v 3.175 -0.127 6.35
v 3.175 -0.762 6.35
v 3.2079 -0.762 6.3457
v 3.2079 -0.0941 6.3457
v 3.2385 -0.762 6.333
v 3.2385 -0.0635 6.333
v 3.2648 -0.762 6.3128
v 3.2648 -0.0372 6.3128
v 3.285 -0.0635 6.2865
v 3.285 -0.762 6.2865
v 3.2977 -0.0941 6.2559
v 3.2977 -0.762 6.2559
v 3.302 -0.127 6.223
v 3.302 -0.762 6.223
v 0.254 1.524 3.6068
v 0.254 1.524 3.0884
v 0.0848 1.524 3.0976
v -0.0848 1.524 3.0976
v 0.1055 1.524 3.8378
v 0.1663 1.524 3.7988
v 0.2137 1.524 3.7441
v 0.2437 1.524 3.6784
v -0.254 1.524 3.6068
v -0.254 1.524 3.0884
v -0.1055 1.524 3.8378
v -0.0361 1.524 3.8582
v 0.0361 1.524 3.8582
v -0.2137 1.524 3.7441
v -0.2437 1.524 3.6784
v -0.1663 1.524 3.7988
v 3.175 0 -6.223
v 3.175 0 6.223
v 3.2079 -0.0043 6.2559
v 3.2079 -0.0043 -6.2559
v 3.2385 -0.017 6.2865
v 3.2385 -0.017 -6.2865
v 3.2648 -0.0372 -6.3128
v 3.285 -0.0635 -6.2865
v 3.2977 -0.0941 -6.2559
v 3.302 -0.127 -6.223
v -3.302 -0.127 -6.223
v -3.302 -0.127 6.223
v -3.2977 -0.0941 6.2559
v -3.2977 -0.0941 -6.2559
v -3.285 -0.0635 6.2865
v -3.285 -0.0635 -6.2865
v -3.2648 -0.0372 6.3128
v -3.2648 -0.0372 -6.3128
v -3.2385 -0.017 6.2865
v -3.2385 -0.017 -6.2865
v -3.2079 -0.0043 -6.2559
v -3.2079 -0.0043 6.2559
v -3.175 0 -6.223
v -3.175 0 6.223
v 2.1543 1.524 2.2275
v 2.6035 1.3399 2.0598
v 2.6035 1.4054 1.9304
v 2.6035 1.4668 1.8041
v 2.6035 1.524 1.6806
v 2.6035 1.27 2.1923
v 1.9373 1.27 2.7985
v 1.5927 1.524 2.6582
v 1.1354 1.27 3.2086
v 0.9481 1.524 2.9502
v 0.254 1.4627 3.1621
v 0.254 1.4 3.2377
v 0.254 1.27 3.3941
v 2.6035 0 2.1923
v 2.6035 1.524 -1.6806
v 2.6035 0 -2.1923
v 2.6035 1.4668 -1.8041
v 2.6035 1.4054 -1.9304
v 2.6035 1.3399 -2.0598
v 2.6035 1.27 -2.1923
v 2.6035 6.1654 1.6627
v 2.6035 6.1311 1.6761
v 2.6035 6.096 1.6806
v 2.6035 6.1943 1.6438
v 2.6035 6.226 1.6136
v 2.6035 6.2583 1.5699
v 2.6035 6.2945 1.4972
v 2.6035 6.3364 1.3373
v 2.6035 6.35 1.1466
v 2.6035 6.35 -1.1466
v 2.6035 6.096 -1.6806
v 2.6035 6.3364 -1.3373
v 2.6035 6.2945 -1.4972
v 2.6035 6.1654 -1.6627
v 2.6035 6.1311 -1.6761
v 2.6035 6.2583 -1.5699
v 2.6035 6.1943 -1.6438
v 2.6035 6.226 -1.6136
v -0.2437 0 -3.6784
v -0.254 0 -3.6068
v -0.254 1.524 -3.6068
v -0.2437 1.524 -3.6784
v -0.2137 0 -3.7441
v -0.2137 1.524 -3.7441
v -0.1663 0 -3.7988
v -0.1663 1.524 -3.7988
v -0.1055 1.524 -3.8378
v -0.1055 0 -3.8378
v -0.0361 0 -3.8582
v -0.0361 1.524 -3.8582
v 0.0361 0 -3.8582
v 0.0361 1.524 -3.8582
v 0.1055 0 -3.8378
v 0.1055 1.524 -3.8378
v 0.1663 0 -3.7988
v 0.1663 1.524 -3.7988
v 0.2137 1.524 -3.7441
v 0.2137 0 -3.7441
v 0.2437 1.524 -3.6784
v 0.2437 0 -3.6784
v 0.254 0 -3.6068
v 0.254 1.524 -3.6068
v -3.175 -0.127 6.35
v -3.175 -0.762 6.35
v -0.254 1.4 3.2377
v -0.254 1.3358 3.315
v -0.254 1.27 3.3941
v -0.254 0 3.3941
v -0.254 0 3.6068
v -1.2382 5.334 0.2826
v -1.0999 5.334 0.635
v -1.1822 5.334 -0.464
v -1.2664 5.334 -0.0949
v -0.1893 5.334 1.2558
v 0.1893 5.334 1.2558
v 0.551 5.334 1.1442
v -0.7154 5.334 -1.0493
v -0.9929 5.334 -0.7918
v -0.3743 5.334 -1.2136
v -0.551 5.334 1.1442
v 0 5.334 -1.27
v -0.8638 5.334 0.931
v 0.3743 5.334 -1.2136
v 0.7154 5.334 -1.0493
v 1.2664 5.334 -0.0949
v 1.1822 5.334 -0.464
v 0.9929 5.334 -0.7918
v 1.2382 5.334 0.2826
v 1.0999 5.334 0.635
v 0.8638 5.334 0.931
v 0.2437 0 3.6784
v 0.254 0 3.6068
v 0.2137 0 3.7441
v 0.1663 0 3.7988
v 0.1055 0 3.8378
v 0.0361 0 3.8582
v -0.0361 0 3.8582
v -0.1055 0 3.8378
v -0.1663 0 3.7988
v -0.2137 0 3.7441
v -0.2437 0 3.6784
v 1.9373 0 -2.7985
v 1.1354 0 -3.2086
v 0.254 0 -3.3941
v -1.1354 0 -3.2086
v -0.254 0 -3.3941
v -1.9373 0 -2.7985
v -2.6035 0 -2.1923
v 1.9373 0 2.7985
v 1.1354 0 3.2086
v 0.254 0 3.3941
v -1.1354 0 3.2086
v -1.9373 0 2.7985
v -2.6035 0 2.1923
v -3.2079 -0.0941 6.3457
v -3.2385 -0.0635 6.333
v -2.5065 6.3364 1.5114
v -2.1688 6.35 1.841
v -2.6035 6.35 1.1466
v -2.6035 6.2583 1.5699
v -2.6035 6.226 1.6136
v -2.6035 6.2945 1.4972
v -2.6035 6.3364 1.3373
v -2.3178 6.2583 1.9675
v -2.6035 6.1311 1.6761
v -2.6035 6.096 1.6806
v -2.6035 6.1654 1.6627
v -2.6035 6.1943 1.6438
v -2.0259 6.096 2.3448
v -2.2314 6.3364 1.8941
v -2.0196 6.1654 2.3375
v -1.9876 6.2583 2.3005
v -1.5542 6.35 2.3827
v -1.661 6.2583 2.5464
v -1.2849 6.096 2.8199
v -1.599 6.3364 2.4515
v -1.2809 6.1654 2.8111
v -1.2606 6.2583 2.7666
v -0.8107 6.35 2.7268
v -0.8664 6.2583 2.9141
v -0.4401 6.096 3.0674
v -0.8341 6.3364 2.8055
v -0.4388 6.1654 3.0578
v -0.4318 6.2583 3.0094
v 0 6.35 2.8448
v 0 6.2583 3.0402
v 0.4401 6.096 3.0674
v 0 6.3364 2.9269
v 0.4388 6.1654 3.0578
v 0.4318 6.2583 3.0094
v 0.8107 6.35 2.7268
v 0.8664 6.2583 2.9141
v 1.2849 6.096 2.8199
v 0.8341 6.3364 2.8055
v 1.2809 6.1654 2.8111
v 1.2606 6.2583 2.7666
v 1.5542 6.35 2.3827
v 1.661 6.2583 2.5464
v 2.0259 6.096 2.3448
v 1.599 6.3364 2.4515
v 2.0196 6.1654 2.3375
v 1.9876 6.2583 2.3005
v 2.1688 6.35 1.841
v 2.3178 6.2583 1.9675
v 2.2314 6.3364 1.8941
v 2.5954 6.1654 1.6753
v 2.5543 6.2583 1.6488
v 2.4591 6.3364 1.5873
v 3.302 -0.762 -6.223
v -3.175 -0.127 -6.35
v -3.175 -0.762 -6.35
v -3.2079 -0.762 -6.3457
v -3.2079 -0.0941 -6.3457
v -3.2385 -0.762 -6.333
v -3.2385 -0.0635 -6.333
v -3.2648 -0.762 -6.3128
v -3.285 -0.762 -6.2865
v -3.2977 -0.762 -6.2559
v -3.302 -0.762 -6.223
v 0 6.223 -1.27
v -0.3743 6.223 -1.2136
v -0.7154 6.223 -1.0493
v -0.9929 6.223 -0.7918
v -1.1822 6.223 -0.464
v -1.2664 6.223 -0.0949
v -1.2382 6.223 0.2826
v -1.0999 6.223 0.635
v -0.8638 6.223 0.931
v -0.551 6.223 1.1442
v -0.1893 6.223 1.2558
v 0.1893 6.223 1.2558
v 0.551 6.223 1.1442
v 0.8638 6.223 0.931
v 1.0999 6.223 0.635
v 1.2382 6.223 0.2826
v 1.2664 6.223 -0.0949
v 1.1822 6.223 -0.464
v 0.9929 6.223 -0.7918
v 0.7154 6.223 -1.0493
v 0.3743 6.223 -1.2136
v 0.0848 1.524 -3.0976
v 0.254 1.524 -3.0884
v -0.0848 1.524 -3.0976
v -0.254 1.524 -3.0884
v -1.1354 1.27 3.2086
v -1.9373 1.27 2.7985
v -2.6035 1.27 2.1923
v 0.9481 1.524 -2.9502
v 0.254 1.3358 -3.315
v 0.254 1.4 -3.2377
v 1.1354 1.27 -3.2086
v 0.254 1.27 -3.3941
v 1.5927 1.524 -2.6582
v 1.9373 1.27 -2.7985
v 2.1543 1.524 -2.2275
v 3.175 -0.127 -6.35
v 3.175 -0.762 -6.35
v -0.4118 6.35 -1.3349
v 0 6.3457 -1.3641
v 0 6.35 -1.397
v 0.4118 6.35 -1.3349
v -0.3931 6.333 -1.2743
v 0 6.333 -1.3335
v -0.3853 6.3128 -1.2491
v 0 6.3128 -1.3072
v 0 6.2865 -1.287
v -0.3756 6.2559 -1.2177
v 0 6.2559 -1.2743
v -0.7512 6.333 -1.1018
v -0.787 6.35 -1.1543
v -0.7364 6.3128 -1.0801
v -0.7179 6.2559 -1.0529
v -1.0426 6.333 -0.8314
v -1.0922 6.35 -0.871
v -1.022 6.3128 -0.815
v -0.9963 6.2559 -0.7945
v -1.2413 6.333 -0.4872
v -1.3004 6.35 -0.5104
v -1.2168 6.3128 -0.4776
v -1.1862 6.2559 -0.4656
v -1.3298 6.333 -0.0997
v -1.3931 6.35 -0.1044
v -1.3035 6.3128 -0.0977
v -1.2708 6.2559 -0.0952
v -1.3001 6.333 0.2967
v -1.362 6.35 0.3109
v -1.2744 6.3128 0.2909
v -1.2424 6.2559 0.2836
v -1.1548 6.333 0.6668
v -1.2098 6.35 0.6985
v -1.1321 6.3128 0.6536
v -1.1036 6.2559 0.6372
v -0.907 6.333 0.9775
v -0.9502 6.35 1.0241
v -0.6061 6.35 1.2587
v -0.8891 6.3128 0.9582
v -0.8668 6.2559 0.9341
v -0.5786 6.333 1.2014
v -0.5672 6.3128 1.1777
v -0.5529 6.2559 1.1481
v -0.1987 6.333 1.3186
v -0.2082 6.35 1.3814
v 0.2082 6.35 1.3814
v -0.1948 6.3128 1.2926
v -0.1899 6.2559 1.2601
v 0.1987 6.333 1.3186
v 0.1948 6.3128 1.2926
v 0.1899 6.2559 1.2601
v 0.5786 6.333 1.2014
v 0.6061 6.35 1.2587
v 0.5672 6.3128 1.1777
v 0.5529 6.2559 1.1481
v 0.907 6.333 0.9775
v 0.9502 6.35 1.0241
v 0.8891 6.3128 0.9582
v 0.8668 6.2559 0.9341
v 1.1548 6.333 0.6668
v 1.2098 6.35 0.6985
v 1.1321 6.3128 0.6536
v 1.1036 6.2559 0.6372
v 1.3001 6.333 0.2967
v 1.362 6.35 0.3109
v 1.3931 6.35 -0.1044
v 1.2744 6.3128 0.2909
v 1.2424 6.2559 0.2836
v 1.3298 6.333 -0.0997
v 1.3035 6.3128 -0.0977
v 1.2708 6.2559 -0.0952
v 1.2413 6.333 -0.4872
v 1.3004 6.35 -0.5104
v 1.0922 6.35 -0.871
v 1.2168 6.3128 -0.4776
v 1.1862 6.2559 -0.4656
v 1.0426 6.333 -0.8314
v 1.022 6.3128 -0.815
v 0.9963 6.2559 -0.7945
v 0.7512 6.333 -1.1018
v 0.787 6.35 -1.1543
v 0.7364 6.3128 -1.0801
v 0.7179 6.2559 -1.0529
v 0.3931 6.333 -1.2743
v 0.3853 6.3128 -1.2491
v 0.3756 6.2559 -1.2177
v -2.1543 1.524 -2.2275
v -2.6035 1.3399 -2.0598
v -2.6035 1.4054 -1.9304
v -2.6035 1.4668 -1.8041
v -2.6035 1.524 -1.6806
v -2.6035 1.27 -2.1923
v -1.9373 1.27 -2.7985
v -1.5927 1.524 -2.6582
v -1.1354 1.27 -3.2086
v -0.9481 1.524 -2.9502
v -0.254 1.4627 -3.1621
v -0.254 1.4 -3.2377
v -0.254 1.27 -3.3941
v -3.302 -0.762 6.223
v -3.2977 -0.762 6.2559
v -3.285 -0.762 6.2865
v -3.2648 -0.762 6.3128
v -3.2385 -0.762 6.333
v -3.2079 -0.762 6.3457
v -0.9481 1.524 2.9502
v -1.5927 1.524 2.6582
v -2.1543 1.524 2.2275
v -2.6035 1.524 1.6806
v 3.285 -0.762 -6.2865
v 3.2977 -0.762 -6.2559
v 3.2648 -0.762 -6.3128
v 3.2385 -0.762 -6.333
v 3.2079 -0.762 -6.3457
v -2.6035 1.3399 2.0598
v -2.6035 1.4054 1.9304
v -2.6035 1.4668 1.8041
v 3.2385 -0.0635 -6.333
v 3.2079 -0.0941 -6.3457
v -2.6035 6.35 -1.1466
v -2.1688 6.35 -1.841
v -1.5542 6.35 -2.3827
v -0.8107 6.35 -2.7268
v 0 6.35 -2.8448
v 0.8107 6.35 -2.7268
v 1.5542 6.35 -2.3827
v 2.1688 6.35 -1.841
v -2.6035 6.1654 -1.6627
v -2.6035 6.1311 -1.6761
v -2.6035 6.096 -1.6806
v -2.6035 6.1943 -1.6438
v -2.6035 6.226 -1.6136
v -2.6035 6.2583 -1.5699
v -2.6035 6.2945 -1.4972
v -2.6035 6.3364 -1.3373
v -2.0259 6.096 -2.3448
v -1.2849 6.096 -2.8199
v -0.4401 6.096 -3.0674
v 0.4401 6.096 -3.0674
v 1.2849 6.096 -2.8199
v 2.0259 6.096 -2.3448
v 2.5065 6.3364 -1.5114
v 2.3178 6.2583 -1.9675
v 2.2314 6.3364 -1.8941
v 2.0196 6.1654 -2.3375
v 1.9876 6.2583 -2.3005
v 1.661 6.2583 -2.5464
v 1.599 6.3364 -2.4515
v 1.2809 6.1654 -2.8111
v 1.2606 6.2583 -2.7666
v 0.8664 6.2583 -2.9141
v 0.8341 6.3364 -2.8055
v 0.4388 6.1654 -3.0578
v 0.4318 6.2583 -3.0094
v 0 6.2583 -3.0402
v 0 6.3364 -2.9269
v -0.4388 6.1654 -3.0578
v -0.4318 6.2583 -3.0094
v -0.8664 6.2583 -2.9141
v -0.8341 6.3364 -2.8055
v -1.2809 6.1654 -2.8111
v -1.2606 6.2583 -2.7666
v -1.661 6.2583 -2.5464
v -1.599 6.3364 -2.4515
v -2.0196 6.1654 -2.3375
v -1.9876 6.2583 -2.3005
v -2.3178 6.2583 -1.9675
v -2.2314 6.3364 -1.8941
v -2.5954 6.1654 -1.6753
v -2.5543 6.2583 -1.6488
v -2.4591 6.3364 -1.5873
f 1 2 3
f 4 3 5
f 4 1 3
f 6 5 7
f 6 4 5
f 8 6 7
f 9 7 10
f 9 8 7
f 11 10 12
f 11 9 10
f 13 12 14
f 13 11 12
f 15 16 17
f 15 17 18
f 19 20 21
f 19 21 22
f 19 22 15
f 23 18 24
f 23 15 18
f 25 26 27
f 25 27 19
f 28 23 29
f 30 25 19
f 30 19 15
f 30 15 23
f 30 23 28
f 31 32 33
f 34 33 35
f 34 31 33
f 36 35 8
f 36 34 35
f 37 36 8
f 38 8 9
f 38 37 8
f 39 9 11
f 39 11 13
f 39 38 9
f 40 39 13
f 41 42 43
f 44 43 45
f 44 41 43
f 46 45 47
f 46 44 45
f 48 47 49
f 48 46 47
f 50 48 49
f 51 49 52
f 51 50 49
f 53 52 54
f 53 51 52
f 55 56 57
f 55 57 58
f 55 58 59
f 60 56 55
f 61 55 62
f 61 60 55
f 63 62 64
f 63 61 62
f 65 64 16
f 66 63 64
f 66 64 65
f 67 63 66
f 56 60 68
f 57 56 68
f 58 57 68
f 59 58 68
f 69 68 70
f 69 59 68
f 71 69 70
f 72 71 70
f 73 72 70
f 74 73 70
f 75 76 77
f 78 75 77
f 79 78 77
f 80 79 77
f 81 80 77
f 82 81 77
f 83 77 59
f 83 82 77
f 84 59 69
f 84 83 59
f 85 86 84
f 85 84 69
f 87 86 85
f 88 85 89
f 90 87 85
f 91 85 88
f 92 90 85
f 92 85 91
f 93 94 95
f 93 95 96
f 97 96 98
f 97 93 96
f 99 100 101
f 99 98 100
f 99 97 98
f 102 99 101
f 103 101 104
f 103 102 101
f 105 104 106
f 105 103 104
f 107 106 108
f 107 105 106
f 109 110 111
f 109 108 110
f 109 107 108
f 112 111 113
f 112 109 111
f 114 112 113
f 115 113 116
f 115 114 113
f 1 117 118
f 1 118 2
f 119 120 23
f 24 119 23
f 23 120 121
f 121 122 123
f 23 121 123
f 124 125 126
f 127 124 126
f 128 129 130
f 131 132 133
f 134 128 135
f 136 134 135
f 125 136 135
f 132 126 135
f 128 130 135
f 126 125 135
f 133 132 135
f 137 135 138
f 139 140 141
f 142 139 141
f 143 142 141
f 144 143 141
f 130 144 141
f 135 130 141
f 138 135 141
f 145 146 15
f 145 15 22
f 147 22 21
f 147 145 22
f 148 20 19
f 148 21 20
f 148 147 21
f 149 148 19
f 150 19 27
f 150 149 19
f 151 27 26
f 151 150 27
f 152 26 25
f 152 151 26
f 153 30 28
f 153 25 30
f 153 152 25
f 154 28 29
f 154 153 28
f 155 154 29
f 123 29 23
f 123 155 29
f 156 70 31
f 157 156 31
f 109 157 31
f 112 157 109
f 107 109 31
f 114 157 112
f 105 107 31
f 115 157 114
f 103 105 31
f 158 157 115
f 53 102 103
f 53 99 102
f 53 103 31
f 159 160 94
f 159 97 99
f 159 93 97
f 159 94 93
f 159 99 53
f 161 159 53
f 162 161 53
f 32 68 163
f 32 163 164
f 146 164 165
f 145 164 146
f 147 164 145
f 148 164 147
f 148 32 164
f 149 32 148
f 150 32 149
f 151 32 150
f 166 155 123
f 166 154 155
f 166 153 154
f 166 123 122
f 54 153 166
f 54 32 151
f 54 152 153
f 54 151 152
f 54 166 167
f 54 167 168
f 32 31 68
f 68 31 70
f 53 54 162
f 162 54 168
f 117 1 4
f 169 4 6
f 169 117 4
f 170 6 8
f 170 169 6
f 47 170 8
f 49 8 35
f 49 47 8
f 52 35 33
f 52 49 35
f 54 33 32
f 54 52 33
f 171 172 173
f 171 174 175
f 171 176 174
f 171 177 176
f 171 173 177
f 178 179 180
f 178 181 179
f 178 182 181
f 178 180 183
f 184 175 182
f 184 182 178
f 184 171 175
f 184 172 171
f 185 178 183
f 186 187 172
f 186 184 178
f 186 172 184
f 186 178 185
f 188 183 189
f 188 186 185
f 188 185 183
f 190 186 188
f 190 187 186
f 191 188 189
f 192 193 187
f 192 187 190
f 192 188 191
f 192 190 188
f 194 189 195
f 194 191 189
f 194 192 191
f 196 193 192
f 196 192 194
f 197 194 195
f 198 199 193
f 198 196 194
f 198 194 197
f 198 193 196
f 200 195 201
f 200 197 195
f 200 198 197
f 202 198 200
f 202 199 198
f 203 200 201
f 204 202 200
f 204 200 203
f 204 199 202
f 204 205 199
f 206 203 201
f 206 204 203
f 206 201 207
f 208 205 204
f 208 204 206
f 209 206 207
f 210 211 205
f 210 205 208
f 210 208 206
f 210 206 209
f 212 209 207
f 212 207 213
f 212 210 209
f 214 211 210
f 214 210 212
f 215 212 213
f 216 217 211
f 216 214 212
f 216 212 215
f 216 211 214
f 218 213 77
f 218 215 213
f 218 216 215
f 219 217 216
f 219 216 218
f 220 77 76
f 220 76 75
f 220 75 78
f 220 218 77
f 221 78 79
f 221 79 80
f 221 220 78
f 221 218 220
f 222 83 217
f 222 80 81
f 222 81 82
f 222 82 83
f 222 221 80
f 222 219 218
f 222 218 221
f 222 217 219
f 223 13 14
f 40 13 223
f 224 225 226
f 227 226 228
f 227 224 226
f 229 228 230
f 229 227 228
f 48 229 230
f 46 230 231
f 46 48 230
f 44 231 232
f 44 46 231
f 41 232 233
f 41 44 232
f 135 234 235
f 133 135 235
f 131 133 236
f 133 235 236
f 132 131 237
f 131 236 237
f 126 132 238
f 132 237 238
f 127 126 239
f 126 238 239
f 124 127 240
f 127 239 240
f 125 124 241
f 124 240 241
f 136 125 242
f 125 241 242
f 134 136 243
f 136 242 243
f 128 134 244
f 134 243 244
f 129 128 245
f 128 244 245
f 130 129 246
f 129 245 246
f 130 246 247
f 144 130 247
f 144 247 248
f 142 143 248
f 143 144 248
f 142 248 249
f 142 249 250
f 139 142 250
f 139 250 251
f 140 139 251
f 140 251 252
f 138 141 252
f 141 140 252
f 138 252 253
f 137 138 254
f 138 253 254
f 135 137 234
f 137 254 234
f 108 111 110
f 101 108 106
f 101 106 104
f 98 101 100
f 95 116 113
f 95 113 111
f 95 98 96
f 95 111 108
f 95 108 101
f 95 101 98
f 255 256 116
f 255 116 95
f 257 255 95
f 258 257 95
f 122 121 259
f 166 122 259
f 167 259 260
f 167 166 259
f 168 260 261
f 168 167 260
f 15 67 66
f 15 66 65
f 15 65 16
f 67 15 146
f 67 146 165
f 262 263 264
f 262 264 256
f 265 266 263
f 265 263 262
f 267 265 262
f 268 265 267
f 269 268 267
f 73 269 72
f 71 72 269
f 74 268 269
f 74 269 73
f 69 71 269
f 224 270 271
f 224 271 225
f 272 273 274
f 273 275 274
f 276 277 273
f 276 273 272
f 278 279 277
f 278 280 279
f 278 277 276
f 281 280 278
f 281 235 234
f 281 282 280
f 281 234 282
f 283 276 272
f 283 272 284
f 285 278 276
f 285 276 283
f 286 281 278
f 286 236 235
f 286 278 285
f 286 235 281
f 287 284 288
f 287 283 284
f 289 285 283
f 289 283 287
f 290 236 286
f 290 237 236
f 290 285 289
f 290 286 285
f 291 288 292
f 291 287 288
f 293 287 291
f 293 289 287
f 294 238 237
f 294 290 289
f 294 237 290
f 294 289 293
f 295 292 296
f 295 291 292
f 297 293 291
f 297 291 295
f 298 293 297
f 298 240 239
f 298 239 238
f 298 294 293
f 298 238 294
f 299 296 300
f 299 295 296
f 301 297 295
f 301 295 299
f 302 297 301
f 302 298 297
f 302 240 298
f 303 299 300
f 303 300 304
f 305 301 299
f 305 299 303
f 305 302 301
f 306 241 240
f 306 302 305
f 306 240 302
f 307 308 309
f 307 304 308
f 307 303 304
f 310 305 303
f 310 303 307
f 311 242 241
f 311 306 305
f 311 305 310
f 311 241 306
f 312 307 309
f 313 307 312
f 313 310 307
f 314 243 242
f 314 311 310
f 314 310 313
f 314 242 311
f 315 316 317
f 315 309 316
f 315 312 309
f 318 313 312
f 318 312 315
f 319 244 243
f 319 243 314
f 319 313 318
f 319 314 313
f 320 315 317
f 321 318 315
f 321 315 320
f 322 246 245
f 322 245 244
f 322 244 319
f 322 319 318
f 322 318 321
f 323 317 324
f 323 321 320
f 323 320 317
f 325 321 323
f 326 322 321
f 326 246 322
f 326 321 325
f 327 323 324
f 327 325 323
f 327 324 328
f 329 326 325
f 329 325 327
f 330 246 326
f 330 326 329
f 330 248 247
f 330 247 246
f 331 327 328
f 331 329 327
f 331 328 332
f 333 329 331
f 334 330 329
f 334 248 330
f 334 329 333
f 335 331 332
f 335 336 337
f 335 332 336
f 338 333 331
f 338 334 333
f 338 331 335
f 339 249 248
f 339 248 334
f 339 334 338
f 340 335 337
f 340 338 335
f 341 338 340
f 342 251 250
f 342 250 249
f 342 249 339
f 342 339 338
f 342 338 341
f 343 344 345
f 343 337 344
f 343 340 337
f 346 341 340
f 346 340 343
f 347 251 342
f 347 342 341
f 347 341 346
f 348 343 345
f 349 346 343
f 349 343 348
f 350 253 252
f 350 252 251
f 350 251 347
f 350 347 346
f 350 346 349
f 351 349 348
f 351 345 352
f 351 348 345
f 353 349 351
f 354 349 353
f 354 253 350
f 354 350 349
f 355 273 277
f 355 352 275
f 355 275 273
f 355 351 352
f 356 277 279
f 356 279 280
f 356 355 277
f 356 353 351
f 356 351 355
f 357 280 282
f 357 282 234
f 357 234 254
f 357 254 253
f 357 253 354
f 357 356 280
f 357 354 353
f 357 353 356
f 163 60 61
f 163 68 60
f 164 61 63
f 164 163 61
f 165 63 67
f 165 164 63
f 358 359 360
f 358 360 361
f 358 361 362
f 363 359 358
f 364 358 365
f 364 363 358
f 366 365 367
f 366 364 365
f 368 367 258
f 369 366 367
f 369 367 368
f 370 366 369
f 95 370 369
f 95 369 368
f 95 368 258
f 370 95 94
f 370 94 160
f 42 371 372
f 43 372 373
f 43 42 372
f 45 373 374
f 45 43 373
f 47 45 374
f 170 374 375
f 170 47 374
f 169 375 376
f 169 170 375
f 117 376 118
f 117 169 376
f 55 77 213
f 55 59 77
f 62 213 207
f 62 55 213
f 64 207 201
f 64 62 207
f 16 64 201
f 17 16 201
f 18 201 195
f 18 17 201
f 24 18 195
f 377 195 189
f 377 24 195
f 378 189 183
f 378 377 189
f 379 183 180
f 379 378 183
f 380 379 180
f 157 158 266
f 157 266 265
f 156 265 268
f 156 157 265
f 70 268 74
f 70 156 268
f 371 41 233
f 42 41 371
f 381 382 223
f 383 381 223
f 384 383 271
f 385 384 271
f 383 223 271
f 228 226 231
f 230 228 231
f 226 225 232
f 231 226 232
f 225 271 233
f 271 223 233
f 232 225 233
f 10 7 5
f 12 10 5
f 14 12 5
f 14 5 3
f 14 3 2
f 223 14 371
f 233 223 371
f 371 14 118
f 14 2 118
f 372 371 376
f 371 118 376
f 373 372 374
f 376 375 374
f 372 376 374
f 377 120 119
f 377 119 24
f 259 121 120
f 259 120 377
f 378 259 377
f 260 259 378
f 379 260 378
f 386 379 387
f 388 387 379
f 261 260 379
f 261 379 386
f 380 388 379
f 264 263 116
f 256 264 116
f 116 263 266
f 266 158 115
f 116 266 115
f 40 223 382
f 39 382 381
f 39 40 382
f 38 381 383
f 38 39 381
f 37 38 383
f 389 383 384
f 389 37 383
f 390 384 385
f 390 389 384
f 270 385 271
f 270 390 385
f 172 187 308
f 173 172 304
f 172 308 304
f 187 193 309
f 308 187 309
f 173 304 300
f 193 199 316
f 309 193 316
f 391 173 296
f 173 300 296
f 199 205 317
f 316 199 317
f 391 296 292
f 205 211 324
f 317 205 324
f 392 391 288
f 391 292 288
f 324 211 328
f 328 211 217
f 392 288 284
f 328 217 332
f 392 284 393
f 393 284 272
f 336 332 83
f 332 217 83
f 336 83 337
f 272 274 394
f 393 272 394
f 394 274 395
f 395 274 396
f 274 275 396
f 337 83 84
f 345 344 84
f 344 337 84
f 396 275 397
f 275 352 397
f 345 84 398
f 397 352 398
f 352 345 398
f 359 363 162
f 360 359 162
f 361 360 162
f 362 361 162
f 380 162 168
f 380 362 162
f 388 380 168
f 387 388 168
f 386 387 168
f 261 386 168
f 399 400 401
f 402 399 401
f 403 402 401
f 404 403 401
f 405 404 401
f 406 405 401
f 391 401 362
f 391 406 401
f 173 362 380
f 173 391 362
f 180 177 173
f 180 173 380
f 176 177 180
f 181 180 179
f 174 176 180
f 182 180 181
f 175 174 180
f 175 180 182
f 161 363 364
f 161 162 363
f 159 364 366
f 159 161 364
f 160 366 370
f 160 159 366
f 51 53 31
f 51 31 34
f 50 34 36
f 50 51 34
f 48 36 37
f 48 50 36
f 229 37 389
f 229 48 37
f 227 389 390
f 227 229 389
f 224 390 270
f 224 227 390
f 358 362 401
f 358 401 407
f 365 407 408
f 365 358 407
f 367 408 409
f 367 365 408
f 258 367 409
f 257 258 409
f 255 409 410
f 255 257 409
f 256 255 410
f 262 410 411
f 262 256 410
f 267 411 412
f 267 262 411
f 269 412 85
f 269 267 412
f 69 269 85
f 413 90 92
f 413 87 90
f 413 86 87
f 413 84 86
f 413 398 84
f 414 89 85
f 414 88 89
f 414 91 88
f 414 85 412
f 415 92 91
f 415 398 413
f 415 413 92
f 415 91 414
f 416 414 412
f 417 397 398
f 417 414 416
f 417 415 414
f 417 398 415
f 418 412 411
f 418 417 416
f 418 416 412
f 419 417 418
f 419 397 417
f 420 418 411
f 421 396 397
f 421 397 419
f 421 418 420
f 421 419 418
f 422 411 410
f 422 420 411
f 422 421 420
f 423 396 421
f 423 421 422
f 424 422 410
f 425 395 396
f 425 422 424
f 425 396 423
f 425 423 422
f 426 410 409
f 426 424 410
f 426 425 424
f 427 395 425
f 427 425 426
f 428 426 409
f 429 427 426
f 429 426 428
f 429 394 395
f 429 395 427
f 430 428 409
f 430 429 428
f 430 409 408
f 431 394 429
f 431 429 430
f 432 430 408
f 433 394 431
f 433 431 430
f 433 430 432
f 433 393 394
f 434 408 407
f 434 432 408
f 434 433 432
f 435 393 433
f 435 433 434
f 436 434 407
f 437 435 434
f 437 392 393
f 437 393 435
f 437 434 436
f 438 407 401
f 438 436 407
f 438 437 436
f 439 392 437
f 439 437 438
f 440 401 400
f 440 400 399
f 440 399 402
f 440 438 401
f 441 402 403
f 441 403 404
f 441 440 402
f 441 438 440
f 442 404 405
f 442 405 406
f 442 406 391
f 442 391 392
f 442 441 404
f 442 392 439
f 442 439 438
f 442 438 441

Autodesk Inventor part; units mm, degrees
sketch "Sketch_1" plane through (0, 0, 0) normal (0, 1, 0) x (-1, 0, 0)
  line L0 (3.302, -6.223) -> (3.302, 6.223)
  arc A0 (3.302, 6.223) -> (3.175, 6.35) centre (3.175, 6.223) ccw
  line L1 (3.175, 6.35) -> (-3.175, 6.35)
  arc A1 (-3.175, 6.35) -> (-3.302, 6.223) centre (-3.175, 6.223) ccw
  line L2 (-3.302, 6.223) -> (-3.302, -6.223)
  arc A2 (-3.302, -6.223) -> (-3.175, -6.35) centre (-3.175, -6.223) ccw
  line L3 (-3.175, -6.35) -> (3.175, -6.35)
  arc A3 (3.175, -6.35) -> (3.302, -6.223) centre (3.175, -6.223) ccw
extrude "Extrusion1" add sketch "Sketch_1" against normal blind 0.762
sketch "Sketch_2" plane through (0, 0, 0) normal (0, 0, 1) x (1, 0, 0)
  line L0 (-3.302, 0.254) -> (-3.302, -0.127)
  arc A0 (-3.175, 0) -> (-3.302, -0.127) centre (-3.175, -0.127) ccw
  line L1 (-3.175, 0) -> (3.175, 0)
  arc A1 (3.302, -0.127) -> (3.175, 0) centre (3.175, -0.127) ccw
  line L2 (3.302, -0.127) -> (3.302, 0.254)
  line L3 (3.302, 0.254) -> (-3.302, 0.254)
extrude "Extrusion2" cut sketch "Sketch_2" along normal mid plane 12.7
sketch "Sketch_3" plane through (0, 0, 0) normal (1, 0, 0) x (0, 1, 0)
  line L0 (0.254, 6.35) -> (-0.127, 6.35)
  arc A0 (0, 6.223) -> (-0.127, 6.35) centre (-0.127, 6.223) ccw
  line L1 (0, 6.223) -> (0, -6.223)
  arc A1 (-0.127, -6.35) -> (0, -6.223) centre (-0.127, -6.223) ccw
  line L2 (-0.127, -6.35) -> (0.254, -6.35)
  line L3 (0.254, -6.35) -> (0.254, 6.35)
extrude "Extrusion3" cut sketch "Sketch_3" along normal mid plane 12.7
sketch "Sketch_4" plane through (0, 0, 0) normal (1, 0, 0) x (0, 1, 0)
  line L0 (0, 0) -> (6.35, 0)
  line L1 (5.334, 0) -> (5.334, -1.27)
  line L2 (5.334, -1.27) -> (6.223, -1.27)
  arc A0 (6.35, -1.397) -> (6.223, -1.27) centre (6.223, -1.397) ccw
  line L3 (6.35, -1.397) -> (6.35, -2.8448)
  arc A1 (6.096, -3.0988) -> (6.35, -2.8448) centre (6.096, -2.8448) ccw
  line L4 (6.096, -3.0988) -> (1.524, -3.0988)
  line L5 (1.524, -3.0988) -> (1.27, -3.4036)
  line L6 (1.27, -3.4036) -> (0, -3.4036)
  line L7 (0, -3.4036) -> (0, 0)
  line L8 (0, 0) -> (5.334, 0)
revolve "Revolution1" add sketch "Sketch_4" angle 360 about axis through (0, 0, 0) along (0, -1, 0)
sketch "Sketch_5" plane through (0, 0, 0) normal (0, 1, 0) x (-1, 0, 0)
  line L0 (0.254, -3.6068) -> (0.254, 3.6068)
  arc A0 (0.254, 3.6068) -> (-0.254, 3.6068) centre (0, 3.6068) ccw
  line L1 (-0.254, 3.6068) -> (-0.254, -3.6068)
  arc A1 (-0.254, -3.6068) -> (0.254, -3.6068) centre (0, -3.6068) ccw
extrude "Extrusion4" add sketch "Sketch_5" along normal blind 1.524
sketch "Sketch_6" plane through (0, 6.35, 0) normal (0, 1, 0) x (1, 0, 0)
  line L0 (-3.8735, -5.08) -> (3.8735, -5.08)
  line L1 (3.8735, -5.08) -> (3.8735, 5.08)
  line L2 (3.8735, 5.08) -> (-3.8735, 5.08)
  line L3 (-3.8735, 5.08) -> (-3.8735, -5.08)
  line L4 (-2.6035, 4.572) -> (-2.6035, -4.572)
  line L5 (-2.6035, -4.572) -> (2.6035, -4.572)
  line L6 (2.6035, -4.572) -> (2.6035, 4.572)
  line L7 (2.6035, 4.572) -> (-2.6035, 4.572)
extrude "Extrusion5" cut sketch "Sketch_6" against normal blind 6.35
ref_plane "body_XY" through (0, -0.762, 0) normal (0, 1, 0) x (1, 0, 0)
ref_plane "body_YZ" through (0, -0.762, 0) normal (1, 0, 0) x (0, 0, -1)
ref_plane "body_ZX" through (0, -0.762, 0) normal (0, 0, -1) x (0, 1, 0)
ref_plane "bus_brac_XY" through (0, 0, 0) normal (0, -1, 0) x (1, 0, 0)
ref_plane "bus_brac_YZ" through (0, 0, 0) normal (1, 0, 0) x (0, 0, 1)
ref_plane "bus_brac_ZX" through (0, 0, 0) normal (0, 0, 1) x (0, -1, 0)
ref_plane "toggle_XY" through (0, 6.35, 0) normal (0, -1, 0) x (1, 0, 0)
ref_plane "toggle_YZ" through (0, 6.35, 0) normal (1, 0, 0) x (0, 0, 1)
ref_plane "toggle_ZX" through (0, 6.35, 0) normal (0, 0, 1) x (0, -1, 0)
properties part number "M2T12A5bush"
